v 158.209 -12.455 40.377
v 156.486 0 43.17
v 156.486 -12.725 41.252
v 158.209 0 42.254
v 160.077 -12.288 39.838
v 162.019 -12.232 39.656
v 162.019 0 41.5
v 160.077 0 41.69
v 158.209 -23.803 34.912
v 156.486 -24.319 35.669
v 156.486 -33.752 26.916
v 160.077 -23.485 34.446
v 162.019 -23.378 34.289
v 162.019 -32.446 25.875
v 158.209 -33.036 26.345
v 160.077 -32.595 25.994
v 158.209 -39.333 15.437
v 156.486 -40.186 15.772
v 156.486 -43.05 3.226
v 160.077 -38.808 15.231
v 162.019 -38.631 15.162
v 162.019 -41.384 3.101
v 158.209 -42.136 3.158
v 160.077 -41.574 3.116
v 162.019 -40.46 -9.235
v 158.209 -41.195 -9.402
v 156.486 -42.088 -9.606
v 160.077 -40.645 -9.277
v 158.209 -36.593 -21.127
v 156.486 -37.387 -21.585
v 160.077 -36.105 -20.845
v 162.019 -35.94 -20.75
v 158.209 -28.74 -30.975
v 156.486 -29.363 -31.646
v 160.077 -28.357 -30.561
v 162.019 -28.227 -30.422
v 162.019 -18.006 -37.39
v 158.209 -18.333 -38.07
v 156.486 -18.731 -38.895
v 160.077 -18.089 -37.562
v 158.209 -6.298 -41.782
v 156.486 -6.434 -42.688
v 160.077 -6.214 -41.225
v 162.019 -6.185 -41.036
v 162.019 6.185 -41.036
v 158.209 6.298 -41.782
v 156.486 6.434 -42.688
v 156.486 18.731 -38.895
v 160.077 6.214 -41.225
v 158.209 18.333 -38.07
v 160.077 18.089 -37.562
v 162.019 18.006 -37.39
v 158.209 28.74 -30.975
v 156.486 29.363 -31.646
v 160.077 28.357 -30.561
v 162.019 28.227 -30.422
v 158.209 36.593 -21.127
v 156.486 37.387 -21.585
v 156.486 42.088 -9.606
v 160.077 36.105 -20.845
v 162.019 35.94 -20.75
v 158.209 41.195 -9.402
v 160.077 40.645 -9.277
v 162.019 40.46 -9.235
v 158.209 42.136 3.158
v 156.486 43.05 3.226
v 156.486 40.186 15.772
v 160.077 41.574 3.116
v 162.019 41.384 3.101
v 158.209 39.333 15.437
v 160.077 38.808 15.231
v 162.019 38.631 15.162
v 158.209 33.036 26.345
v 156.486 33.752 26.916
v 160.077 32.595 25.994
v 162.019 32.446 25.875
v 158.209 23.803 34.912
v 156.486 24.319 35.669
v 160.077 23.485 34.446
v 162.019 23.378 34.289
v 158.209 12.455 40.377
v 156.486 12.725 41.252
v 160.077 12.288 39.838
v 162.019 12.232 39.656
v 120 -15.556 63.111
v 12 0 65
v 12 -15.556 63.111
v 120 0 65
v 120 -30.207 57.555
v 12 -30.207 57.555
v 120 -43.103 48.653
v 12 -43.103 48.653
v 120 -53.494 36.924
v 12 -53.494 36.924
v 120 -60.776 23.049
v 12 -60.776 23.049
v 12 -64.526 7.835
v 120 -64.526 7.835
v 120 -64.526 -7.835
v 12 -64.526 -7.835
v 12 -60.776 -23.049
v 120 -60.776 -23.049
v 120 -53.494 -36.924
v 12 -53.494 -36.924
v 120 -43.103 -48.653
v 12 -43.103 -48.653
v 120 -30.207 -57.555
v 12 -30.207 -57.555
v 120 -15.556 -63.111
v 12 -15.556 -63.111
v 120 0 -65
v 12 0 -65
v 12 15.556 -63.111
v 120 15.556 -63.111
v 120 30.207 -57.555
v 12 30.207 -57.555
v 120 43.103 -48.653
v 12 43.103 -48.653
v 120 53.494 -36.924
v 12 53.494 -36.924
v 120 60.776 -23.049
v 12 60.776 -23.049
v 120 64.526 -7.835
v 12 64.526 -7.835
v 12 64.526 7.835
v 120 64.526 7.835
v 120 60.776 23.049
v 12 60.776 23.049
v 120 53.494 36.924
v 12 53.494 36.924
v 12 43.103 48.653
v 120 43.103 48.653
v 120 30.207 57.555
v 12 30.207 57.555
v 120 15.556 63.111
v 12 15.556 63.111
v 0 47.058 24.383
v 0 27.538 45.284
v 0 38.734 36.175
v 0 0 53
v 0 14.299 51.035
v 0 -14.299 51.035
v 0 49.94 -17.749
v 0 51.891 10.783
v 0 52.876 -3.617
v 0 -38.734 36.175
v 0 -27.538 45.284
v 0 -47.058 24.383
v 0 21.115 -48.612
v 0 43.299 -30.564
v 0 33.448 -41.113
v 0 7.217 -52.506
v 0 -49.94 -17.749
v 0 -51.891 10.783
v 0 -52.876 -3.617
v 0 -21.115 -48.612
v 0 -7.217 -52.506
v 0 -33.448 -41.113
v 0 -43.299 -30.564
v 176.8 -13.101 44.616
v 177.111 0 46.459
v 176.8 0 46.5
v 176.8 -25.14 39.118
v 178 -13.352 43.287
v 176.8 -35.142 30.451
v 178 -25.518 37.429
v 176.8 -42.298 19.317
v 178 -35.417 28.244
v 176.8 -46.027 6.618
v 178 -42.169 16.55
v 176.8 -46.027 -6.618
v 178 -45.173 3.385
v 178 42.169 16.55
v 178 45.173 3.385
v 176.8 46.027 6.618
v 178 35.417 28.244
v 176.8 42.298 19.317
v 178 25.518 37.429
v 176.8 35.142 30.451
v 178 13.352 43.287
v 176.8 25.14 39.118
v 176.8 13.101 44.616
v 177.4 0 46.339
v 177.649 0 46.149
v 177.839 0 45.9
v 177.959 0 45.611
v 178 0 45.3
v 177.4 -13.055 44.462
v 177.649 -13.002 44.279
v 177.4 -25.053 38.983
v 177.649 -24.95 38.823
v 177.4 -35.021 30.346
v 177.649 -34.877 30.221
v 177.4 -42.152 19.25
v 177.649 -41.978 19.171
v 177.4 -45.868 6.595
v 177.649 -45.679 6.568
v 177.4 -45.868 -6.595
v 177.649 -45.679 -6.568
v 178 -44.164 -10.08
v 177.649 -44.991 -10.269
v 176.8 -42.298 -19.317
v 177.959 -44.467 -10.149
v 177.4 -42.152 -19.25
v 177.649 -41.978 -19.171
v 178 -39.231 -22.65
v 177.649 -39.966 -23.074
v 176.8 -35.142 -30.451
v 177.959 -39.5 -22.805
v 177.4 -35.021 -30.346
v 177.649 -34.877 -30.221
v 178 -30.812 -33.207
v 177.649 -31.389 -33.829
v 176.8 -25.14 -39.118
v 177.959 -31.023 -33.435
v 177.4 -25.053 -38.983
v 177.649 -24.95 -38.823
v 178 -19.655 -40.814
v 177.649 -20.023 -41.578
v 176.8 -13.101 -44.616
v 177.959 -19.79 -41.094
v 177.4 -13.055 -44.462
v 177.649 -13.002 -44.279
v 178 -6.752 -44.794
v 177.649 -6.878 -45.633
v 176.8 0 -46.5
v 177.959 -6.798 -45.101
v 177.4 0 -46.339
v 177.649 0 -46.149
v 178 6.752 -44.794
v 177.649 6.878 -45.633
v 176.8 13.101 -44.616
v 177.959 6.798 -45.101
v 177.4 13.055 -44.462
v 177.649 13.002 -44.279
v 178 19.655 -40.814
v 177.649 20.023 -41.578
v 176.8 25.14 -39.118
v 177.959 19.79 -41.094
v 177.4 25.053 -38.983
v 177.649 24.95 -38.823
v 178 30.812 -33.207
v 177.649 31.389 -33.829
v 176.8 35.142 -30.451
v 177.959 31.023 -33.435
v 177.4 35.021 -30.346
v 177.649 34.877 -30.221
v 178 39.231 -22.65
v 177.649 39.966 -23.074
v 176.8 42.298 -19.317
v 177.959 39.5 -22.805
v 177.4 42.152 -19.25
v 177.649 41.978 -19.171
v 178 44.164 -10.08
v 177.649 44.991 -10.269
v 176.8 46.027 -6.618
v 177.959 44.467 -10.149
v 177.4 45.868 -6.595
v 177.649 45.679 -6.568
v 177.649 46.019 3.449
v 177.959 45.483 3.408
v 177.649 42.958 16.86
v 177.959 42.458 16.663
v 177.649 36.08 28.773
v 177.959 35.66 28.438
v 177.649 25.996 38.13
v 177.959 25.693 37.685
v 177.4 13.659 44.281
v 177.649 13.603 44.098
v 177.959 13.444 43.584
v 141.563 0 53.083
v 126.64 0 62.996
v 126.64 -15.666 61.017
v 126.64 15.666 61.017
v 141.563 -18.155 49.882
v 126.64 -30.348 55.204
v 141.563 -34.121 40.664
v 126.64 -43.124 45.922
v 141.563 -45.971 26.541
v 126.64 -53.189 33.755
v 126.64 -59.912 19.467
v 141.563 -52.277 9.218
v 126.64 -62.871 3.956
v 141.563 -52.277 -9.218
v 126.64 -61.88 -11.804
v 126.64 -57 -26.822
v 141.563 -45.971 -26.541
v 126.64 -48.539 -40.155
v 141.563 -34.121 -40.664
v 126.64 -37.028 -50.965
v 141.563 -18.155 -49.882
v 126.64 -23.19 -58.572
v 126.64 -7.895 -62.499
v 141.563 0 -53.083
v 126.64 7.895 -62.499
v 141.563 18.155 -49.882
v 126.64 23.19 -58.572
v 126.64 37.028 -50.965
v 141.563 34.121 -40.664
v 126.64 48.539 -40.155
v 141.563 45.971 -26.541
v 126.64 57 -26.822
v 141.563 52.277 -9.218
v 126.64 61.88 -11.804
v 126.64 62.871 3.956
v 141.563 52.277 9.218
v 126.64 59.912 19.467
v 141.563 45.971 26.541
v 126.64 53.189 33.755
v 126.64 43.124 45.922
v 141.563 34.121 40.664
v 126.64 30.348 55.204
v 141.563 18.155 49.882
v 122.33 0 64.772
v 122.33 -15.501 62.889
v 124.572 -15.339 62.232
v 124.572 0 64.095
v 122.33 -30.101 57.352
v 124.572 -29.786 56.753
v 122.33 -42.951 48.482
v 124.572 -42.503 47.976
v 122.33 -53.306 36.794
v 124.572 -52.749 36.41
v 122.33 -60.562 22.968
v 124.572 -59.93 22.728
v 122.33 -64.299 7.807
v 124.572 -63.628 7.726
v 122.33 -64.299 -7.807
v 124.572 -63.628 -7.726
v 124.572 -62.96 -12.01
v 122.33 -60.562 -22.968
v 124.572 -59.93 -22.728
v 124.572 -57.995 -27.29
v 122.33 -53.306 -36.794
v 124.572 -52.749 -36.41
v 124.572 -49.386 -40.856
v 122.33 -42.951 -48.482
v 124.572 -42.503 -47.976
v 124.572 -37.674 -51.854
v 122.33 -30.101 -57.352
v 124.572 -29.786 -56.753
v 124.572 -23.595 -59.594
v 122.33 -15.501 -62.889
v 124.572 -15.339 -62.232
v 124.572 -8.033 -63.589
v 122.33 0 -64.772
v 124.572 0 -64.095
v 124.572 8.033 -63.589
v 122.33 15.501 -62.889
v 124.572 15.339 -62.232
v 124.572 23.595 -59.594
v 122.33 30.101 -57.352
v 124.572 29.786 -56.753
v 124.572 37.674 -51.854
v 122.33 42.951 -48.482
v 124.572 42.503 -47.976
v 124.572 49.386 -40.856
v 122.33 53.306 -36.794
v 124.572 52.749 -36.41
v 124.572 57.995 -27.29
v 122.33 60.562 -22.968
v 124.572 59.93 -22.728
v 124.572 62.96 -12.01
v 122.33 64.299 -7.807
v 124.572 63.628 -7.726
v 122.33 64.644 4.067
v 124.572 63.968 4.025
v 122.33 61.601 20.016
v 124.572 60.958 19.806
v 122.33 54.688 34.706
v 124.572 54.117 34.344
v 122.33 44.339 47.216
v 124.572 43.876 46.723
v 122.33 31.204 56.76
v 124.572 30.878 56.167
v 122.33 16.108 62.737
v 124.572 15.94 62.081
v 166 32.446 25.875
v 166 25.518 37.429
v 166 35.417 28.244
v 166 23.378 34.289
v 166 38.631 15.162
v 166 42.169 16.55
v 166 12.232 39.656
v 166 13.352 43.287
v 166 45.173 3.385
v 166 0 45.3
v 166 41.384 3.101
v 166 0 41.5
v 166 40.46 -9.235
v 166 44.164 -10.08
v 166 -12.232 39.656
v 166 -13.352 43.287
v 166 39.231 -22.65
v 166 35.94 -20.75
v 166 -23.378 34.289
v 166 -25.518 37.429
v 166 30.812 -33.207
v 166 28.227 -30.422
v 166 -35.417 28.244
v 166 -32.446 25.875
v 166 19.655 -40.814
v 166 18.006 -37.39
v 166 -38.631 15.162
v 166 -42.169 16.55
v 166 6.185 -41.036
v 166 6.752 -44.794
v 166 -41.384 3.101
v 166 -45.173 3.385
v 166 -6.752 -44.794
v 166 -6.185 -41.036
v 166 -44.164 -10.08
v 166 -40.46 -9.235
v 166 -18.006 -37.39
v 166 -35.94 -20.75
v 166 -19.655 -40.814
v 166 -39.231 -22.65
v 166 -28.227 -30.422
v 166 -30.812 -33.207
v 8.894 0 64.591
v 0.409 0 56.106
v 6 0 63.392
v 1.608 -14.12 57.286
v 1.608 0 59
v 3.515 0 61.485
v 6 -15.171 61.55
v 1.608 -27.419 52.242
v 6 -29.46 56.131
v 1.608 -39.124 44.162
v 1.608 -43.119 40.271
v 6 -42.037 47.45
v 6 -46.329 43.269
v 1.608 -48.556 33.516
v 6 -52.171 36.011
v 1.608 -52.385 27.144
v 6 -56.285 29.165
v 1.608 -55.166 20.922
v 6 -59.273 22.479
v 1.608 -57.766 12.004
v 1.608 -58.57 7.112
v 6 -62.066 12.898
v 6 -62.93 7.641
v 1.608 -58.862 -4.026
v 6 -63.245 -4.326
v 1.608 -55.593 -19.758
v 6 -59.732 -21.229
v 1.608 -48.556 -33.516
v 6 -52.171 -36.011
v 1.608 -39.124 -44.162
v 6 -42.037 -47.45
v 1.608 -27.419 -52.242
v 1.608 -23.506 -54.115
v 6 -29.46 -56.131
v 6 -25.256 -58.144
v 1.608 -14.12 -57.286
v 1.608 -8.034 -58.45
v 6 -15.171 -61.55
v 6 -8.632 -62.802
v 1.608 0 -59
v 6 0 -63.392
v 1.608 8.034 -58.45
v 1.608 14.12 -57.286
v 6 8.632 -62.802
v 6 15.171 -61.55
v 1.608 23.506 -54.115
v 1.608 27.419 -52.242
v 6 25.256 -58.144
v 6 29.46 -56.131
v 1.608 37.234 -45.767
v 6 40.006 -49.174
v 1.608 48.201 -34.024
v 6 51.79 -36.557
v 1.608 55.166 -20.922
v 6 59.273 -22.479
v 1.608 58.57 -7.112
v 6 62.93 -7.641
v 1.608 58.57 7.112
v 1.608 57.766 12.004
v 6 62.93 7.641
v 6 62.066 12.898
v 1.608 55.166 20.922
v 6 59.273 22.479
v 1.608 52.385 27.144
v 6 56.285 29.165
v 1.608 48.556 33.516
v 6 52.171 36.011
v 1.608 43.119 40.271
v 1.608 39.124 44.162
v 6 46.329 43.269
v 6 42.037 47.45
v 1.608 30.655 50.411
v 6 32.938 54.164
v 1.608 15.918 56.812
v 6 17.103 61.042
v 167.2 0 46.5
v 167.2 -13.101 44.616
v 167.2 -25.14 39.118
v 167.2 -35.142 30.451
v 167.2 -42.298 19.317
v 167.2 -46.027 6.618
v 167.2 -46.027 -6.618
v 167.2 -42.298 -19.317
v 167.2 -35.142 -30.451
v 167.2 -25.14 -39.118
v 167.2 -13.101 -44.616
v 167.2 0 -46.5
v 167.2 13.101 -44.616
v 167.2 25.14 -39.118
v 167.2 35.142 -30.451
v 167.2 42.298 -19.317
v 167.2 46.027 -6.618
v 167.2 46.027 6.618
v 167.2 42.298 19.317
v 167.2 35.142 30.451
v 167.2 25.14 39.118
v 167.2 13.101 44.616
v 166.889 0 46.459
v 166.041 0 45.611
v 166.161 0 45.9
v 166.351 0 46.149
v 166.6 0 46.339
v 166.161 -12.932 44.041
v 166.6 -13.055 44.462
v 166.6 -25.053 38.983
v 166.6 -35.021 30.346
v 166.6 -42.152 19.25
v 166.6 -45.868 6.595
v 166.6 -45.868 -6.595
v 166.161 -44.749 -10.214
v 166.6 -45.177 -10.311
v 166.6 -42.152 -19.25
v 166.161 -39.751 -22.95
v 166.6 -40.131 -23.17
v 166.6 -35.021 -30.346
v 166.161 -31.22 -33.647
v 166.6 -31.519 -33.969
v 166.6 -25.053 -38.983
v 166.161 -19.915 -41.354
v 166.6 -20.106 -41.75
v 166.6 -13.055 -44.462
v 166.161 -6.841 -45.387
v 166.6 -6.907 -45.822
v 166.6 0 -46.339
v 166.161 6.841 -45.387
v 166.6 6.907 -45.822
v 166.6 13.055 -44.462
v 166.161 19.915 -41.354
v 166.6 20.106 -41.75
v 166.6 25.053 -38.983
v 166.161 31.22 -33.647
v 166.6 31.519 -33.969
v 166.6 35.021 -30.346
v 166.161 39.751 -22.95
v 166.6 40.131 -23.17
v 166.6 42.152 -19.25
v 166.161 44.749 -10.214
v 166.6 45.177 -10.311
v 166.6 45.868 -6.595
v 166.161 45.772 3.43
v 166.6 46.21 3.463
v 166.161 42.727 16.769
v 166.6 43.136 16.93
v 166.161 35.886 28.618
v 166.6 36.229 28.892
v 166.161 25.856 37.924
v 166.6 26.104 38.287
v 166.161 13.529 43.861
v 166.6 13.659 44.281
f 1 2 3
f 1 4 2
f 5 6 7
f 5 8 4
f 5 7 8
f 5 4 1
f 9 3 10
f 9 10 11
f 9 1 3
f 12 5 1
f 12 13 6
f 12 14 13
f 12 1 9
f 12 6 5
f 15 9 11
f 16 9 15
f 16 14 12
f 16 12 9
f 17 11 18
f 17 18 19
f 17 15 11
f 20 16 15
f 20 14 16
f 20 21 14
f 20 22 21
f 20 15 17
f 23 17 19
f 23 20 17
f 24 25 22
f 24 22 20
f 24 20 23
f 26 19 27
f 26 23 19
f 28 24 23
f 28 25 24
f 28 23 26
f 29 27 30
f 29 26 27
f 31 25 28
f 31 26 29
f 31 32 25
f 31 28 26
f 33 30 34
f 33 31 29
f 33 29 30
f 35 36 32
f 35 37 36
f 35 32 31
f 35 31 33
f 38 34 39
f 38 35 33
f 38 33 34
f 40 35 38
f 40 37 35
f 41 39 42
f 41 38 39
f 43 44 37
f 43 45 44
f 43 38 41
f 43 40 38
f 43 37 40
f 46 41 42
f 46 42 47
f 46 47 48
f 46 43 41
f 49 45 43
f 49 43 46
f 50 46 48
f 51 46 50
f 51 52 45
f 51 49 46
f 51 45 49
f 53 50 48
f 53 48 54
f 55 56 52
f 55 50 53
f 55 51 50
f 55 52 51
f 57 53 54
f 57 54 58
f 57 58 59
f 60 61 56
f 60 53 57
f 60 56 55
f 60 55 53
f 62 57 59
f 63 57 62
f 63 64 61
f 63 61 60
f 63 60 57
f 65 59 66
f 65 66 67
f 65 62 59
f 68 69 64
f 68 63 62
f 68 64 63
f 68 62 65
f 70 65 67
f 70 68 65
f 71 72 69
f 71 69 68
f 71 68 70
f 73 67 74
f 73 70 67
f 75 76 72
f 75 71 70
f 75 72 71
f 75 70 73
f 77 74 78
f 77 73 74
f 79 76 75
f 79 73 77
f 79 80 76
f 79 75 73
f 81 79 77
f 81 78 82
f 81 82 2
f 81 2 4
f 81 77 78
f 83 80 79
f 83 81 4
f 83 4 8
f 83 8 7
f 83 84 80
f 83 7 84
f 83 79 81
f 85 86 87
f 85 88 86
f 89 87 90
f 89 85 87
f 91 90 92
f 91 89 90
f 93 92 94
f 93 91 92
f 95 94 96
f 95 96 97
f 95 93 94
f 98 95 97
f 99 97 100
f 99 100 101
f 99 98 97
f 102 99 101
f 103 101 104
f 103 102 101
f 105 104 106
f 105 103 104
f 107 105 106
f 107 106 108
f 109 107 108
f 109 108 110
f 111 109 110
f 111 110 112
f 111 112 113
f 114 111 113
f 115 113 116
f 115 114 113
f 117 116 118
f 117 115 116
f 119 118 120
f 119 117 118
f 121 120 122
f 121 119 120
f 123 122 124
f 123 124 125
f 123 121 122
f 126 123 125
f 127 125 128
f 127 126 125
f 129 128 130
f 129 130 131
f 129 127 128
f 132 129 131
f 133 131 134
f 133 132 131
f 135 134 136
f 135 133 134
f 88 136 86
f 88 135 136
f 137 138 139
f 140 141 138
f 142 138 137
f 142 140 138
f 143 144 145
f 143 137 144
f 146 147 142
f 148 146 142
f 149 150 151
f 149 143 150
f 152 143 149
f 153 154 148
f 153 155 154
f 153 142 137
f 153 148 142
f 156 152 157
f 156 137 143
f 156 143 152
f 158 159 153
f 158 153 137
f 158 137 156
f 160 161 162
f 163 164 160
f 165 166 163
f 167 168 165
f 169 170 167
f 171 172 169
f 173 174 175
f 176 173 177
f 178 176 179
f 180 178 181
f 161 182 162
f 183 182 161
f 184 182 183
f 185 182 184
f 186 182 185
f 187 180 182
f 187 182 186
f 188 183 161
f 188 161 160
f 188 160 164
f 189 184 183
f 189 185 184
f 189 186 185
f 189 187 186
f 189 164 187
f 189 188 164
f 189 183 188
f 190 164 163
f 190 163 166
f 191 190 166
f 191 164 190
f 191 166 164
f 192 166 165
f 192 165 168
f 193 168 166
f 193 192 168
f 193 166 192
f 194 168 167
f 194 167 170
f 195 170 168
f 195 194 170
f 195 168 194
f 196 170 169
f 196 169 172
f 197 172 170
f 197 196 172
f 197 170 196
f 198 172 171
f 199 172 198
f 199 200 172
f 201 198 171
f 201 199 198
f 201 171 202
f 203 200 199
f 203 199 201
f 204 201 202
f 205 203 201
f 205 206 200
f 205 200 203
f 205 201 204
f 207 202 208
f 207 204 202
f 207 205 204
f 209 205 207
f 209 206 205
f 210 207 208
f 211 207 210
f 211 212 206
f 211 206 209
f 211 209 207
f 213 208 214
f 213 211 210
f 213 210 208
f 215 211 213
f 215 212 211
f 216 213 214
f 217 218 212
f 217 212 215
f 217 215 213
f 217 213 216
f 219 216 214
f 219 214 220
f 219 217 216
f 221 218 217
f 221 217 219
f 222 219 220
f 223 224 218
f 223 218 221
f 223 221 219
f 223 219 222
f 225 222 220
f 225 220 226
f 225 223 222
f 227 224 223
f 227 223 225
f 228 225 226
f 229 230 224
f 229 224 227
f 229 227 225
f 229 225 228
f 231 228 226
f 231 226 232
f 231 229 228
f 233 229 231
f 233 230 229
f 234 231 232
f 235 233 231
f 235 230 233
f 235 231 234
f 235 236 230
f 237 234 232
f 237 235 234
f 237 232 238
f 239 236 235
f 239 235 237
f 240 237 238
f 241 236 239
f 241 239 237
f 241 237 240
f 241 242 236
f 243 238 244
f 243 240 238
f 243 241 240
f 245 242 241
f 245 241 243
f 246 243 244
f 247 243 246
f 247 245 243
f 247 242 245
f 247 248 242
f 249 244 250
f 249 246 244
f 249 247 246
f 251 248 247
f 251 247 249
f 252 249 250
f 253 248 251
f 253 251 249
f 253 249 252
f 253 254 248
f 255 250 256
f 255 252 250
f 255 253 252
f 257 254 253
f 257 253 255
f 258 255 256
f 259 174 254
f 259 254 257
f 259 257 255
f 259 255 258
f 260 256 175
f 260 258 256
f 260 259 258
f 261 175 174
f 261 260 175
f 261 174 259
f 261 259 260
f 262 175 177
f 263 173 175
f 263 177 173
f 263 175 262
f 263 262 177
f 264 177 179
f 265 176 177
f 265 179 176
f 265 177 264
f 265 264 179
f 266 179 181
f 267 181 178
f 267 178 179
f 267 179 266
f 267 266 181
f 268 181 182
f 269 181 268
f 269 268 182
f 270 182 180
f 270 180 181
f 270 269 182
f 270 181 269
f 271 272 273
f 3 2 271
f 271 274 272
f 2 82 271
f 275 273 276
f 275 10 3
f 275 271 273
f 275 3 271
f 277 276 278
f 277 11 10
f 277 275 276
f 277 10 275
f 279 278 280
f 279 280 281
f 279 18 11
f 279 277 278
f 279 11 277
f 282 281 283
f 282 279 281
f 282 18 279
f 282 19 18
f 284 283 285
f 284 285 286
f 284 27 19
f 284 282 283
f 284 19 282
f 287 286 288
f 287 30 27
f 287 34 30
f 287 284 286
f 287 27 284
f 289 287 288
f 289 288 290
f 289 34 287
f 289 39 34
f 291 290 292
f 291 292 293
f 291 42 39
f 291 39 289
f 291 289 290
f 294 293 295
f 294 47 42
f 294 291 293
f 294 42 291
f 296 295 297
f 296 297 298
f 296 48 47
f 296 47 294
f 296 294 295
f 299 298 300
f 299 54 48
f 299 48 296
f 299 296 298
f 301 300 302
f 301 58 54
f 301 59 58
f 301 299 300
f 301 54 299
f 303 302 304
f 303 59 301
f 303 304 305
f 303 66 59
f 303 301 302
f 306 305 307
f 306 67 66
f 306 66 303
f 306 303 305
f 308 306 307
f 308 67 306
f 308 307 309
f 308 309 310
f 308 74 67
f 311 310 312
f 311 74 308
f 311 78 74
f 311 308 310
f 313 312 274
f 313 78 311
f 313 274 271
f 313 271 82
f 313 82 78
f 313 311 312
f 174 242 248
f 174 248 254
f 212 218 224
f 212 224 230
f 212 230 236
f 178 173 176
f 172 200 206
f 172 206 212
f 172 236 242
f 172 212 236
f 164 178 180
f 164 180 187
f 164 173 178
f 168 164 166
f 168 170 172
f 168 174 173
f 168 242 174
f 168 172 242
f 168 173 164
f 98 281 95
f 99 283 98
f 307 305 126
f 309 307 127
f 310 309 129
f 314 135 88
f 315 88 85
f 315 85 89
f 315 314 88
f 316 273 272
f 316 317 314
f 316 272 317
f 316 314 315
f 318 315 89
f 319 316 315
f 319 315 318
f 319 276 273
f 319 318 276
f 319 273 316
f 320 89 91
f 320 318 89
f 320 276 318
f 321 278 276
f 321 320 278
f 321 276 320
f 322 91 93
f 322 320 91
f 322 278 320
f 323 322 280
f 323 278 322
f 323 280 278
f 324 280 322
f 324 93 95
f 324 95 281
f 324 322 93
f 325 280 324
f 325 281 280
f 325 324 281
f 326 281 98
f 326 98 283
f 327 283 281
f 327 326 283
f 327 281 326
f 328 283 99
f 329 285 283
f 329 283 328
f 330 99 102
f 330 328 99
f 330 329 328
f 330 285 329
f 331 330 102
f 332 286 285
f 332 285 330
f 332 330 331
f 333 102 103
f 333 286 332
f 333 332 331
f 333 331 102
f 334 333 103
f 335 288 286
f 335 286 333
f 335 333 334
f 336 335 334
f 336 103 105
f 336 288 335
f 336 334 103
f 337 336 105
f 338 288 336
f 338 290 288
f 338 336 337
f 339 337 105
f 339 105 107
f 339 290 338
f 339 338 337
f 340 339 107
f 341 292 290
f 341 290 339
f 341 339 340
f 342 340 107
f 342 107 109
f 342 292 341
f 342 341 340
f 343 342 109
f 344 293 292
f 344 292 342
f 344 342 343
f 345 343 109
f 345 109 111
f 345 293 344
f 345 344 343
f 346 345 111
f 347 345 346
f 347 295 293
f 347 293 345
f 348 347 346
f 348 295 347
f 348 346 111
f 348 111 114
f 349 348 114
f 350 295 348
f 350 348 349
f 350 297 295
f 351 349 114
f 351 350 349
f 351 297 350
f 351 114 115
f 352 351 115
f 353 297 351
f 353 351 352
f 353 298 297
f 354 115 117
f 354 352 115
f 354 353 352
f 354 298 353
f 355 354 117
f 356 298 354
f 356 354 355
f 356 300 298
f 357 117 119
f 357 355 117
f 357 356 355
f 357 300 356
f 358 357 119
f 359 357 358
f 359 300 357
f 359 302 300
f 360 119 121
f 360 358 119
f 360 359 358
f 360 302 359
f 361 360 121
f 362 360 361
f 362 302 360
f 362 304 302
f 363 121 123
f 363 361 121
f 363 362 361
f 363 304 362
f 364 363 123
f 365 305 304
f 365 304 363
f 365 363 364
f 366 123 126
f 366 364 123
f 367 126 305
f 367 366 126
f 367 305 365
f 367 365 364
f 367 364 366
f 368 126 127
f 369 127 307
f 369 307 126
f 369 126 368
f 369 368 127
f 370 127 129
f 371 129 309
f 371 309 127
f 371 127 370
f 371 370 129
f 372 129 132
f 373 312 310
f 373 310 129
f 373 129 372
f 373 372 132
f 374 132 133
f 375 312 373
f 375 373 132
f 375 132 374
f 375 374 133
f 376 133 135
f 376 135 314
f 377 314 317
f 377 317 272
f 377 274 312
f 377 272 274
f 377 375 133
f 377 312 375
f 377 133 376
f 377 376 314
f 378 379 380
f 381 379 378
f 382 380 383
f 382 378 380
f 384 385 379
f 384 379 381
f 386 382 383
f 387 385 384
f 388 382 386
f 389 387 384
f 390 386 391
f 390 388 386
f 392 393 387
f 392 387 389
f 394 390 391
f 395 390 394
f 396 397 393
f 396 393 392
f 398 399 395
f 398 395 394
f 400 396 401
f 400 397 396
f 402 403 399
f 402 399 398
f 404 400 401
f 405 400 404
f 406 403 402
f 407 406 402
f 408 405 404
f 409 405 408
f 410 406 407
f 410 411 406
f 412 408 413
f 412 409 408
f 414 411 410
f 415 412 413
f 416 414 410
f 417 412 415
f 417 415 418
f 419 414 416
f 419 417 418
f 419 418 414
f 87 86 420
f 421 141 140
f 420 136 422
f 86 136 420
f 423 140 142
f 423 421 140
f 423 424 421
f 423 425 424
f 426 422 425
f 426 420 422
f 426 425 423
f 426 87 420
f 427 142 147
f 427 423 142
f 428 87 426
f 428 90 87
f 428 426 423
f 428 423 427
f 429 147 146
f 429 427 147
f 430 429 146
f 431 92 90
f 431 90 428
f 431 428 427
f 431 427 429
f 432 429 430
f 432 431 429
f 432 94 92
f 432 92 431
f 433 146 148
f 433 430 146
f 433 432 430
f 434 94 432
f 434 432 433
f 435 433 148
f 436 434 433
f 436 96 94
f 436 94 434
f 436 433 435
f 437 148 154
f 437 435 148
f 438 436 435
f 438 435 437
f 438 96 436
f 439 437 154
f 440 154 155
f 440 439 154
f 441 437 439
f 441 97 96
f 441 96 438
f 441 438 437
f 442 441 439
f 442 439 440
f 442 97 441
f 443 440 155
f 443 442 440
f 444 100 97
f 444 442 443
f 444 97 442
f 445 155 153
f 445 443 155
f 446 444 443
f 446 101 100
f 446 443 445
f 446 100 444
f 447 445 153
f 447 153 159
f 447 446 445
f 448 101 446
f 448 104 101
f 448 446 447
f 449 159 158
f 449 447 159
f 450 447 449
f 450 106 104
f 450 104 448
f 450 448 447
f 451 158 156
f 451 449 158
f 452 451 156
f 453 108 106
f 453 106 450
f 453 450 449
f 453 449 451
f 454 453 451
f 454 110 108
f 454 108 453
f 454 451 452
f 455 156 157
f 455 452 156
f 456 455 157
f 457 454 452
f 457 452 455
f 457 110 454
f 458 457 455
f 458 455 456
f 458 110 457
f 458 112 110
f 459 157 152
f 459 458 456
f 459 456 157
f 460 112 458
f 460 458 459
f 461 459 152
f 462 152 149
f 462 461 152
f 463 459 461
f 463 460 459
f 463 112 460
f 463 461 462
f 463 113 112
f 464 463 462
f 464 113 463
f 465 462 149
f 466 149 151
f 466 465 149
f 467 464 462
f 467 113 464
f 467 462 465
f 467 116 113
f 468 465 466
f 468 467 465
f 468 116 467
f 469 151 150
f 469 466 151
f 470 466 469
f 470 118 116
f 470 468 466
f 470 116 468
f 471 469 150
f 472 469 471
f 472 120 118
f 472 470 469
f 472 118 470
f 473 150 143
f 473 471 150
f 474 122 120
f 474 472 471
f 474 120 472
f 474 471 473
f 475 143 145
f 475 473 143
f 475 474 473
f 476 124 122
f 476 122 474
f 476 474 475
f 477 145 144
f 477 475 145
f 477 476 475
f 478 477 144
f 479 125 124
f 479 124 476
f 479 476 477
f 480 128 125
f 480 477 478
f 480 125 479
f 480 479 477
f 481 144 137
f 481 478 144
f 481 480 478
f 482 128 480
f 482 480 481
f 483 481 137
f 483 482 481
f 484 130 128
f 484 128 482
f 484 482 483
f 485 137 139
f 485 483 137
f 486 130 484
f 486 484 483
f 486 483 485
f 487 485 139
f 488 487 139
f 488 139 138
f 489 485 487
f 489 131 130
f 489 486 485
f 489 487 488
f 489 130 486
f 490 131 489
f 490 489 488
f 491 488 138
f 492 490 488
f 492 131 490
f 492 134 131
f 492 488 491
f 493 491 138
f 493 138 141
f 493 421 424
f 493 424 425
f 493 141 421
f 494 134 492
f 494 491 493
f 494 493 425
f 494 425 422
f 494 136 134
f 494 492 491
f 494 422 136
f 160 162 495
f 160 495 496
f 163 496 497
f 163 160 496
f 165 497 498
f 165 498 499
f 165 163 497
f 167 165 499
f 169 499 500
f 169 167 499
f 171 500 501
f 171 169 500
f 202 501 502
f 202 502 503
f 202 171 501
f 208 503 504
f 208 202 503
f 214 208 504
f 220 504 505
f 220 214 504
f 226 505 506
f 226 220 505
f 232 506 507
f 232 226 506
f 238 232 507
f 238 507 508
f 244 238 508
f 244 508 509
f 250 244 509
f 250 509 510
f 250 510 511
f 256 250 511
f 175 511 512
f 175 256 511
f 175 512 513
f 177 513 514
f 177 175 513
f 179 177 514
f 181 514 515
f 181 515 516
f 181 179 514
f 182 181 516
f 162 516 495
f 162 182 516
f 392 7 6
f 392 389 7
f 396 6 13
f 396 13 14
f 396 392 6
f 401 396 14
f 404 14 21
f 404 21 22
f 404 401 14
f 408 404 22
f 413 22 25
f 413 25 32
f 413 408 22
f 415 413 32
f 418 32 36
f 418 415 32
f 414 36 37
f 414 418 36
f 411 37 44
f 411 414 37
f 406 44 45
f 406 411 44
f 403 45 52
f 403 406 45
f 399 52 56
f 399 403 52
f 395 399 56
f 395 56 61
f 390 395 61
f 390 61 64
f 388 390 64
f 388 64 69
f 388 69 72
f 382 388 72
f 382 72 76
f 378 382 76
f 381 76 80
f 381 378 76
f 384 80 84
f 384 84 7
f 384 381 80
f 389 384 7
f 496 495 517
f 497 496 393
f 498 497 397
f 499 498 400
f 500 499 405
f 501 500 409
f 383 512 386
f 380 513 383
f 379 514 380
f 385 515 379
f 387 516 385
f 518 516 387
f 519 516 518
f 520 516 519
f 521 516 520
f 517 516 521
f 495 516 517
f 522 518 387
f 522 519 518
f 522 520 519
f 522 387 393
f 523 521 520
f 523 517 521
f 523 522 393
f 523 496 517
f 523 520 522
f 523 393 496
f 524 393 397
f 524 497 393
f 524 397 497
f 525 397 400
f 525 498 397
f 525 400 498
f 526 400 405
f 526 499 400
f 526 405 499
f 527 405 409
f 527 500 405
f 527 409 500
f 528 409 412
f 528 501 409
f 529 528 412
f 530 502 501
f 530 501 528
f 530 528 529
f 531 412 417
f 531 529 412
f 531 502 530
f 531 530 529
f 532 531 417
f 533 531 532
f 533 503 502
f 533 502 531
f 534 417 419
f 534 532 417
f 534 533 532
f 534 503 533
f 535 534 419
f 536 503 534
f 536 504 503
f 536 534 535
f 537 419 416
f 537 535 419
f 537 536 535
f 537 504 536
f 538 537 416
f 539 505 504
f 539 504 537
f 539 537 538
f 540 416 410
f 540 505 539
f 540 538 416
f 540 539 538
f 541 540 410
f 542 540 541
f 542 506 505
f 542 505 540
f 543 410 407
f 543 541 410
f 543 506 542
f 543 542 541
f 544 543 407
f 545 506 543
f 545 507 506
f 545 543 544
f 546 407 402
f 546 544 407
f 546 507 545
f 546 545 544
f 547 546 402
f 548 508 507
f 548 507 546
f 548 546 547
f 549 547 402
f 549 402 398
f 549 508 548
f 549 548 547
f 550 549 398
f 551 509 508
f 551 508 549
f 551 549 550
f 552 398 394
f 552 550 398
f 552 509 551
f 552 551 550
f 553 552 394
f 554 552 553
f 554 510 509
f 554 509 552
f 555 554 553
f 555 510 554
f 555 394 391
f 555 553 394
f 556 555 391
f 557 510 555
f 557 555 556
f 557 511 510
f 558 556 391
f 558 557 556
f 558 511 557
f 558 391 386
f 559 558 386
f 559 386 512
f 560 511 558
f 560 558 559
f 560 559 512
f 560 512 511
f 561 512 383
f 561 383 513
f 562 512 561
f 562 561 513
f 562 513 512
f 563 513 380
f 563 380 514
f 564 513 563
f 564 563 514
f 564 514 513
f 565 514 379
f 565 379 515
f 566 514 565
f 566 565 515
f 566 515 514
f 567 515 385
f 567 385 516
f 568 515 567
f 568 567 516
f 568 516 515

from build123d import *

# Parameters (mm, degrees)
FILLET1_R = 1.2


with BuildPart() as part:
    # Sketch1 → Revolve1 (revolve)
    with BuildSketch(Plane.XY):
        with BuildLine():
            Line((0, 0), (0, 53))
            ThreePointArc((0, 53), (3.514718626, 61.485281374), (12, 65))
            Line((12, 65), (120, 65))
            ThreePointArc((120, 65), (123.467838025, 64.48799806), (126.63975275, 62.995683239))
            Line((126.63975275, 62.995683239), (156.485534451, 43.170263967))
            ThreePointArc((156.485534451, 43.170263967), (159.128796722, 41.926668283), (162.018661743, 41.5))
            Line((162.018661743, 41.5), (166, 41.5))
            Line((166, 41.5), (166, 46.5))
            Line((166, 46.5), (178, 46.5))
            Line((178, 46.5), (178, 0))
            Line((178, 0), (0, 0))
        make_face()
    revolve(axis=Axis((0, 0, 0), (1, 0, 0)))

    # Fillet1
    fillet1_edges = [part.edges().sort_by_distance(p)[0] for p in [
        (178, -46.5, 0),
        (166, -46.5, 0),
    ]]
    fillet(fillet1_edges, radius=FILLET1_R)


solid = part.part
